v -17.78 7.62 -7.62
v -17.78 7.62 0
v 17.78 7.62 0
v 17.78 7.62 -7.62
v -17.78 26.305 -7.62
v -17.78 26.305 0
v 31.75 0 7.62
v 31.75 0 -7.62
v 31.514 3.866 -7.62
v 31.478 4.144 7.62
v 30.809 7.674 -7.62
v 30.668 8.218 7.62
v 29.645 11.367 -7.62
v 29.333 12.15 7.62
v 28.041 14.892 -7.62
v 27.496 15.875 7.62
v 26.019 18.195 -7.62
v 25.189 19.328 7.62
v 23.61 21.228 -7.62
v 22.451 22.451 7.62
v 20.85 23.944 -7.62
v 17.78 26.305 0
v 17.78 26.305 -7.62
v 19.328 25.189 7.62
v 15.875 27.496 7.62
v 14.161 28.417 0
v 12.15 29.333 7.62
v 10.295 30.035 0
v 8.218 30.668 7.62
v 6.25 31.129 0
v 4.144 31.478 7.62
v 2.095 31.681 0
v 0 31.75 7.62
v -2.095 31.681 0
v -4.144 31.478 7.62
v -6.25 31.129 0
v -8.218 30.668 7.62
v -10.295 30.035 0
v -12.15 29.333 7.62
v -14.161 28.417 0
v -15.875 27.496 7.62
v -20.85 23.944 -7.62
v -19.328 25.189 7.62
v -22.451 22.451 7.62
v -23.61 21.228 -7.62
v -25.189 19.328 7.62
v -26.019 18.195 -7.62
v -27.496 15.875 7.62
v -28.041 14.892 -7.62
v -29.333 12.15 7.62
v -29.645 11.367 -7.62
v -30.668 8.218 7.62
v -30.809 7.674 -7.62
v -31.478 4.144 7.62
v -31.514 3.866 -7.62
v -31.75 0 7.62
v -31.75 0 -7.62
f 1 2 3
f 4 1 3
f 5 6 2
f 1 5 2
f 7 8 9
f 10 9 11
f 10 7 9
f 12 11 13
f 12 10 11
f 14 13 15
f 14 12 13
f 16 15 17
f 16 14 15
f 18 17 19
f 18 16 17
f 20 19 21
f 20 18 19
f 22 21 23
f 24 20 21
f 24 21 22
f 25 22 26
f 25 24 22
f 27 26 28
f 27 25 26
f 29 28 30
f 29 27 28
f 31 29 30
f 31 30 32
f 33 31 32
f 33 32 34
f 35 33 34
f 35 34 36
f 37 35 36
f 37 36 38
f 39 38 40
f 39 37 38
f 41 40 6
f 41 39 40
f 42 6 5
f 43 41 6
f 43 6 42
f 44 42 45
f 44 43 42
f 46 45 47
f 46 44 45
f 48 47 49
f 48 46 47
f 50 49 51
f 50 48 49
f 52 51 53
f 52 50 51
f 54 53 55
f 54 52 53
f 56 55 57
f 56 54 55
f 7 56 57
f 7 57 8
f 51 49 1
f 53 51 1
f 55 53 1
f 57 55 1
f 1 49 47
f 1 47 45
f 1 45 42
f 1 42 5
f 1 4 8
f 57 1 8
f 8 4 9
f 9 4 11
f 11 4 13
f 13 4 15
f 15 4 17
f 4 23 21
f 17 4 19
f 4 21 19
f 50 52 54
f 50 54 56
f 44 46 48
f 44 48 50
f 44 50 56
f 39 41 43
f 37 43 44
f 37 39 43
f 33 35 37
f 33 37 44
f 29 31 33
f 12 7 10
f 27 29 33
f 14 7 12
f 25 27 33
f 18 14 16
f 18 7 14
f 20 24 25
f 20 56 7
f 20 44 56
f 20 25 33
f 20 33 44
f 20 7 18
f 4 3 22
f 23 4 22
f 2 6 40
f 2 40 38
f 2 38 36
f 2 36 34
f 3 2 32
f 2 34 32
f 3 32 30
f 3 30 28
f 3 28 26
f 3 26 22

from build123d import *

# Parameters (mm, degrees)
BOSS_EXTRUDE1_DEPTH = 7.62
CUT_EXTRUDE1_DEPTH  = 7.62


with BuildPart() as part:
    # Sketch1 → Boss-Extrude1 (new, symmetric)
    with BuildSketch(Plane.XY):
        with BuildLine():
            ThreePointArc((31.75, 0), (0, 31.75), (-31.75, 0))
            Line((-31.75, 0), (31.75, 0))
        make_face()
    extrude(amount=BOSS_EXTRUDE1_DEPTH, both=True)

    # Sketch2 → Cut-Extrude1 (cut)
    with BuildSketch(Plane.XY):
        with BuildLine():
            ThreePointArc((17.78, 26.304640275), (0, 31.75), (-17.78, 26.304640275))
            Line((-17.78, 26.304640275), (-17.78, 7.62))
            Line((-17.78, 7.62), (17.78, 7.62))
            Line((17.78, 7.62), (17.78, 26.304640275))
        make_face()
    extrude(amount=-CUT_EXTRUDE1_DEPTH, mode=Mode.SUBTRACT)


solid = part.part
